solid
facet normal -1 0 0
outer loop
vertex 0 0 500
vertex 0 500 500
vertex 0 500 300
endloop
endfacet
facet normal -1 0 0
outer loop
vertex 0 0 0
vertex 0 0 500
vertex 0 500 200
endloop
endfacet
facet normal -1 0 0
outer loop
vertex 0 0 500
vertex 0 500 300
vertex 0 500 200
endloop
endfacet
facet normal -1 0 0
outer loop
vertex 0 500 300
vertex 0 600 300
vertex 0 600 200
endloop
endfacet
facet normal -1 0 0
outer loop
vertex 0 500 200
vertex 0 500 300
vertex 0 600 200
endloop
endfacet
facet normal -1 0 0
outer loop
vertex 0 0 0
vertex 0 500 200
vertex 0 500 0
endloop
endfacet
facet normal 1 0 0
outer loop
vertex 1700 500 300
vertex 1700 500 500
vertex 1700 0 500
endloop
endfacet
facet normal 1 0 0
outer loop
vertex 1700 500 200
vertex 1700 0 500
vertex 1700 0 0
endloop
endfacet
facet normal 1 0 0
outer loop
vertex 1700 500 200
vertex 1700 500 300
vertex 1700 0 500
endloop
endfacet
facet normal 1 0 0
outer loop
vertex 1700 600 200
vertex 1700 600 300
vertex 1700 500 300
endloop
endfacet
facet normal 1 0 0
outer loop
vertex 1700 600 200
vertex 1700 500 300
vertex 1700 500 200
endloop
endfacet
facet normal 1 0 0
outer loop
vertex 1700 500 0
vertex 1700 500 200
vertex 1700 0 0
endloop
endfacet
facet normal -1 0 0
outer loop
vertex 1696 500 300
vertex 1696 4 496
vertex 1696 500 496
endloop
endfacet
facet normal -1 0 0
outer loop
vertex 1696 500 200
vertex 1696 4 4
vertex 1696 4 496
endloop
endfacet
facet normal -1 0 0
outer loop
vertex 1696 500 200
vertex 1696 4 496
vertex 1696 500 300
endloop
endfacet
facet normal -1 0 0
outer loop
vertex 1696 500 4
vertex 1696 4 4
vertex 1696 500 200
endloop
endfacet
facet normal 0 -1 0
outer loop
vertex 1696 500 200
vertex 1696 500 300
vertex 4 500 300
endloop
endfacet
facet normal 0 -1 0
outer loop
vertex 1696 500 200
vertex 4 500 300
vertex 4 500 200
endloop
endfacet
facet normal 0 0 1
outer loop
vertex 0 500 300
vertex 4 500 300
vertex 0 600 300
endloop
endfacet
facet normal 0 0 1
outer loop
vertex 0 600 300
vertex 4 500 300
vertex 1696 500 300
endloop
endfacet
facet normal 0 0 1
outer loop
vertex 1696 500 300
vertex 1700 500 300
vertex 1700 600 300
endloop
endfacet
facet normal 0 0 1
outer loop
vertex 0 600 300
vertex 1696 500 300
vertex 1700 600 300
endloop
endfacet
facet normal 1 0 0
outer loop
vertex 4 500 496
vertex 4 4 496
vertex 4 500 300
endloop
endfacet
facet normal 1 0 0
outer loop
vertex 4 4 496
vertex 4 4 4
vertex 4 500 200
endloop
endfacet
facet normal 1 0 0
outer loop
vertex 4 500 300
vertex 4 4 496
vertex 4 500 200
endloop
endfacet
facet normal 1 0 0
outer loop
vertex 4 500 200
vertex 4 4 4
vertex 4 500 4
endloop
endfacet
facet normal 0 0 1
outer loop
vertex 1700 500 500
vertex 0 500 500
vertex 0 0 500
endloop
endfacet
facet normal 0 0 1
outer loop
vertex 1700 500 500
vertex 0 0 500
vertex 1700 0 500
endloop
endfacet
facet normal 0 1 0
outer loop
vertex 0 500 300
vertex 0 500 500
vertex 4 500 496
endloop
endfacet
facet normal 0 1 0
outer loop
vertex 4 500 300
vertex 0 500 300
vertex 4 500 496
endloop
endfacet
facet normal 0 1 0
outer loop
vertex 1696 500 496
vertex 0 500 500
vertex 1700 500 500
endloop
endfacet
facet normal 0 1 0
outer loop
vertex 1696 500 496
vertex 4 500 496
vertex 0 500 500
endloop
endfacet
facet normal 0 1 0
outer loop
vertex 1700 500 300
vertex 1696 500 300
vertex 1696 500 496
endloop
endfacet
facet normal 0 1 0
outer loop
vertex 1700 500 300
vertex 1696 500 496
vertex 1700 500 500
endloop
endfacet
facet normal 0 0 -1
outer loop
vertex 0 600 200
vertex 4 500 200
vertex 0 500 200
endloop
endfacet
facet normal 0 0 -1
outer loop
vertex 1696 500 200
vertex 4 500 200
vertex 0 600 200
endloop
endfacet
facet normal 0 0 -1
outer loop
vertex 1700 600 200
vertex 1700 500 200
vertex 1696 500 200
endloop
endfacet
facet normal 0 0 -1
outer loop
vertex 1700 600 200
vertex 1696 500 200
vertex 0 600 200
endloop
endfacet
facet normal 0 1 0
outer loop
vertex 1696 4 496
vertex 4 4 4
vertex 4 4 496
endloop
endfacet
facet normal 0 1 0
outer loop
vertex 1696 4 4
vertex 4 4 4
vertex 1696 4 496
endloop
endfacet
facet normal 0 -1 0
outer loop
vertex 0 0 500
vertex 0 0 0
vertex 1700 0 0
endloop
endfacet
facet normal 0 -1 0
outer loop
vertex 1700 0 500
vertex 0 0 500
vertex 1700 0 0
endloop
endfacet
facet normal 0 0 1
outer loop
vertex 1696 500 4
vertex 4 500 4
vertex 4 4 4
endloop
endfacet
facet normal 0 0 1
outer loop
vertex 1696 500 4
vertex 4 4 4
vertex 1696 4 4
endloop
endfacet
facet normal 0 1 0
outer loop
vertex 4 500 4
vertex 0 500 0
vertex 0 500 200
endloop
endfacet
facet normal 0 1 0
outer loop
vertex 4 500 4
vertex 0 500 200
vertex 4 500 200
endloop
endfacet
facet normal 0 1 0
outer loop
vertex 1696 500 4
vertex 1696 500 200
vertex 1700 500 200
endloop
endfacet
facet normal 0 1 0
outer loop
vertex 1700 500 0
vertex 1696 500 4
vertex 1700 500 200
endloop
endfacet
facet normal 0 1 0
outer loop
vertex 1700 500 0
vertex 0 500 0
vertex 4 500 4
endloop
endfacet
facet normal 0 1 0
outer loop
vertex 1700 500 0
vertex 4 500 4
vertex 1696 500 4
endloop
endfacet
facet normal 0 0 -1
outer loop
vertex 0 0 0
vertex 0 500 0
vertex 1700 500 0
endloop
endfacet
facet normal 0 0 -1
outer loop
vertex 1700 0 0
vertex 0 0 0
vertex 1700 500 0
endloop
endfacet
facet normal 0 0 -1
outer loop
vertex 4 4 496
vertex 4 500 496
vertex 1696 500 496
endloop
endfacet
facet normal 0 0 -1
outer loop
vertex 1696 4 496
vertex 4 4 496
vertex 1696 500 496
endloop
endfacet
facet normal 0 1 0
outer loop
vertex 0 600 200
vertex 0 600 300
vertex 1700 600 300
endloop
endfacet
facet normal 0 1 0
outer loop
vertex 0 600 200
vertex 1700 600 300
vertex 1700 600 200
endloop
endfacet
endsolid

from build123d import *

# Parameters (mm, degrees)
SKETCH1_W           = 1700
SKETCH1_H           = 500
BOSS_EXTRUDE1_DEPTH = 500
SHELL1_T            = -4
SKETCH2_W           = 100
SKETCH2_H           = 100
BOSS_EXTRUDE2_DEPTH = 1700


with BuildPart() as part:
    # Sketch1 → Boss-Extrude1 (new body)
    with BuildSketch(Plane.XY):
        with Locations((850, 250)):
            Rectangle(SKETCH1_W, SKETCH1_H)
    extrude(amount=BOSS_EXTRUDE1_DEPTH)

    # Shell1
    shell1_openings = [part.faces().sort_by_distance(p)[0] for p in [
        (850, 500, 250),
    ]]
    offset(amount=SHELL1_T, openings=shell1_openings, kind=Kind.INTERSECTION)

    # Sketch2 → Boss-Extrude2 (add)
    with BuildSketch(Plane(origin=(1700, 0, 0), x_dir=(0, 0, -1), z_dir=(1, 0, 0))):
        with Locations((-250, 550)):
            Rectangle(SKETCH2_W, SKETCH2_H)
    extrude(amount=-BOSS_EXTRUDE2_DEPTH)


solid = part.part
